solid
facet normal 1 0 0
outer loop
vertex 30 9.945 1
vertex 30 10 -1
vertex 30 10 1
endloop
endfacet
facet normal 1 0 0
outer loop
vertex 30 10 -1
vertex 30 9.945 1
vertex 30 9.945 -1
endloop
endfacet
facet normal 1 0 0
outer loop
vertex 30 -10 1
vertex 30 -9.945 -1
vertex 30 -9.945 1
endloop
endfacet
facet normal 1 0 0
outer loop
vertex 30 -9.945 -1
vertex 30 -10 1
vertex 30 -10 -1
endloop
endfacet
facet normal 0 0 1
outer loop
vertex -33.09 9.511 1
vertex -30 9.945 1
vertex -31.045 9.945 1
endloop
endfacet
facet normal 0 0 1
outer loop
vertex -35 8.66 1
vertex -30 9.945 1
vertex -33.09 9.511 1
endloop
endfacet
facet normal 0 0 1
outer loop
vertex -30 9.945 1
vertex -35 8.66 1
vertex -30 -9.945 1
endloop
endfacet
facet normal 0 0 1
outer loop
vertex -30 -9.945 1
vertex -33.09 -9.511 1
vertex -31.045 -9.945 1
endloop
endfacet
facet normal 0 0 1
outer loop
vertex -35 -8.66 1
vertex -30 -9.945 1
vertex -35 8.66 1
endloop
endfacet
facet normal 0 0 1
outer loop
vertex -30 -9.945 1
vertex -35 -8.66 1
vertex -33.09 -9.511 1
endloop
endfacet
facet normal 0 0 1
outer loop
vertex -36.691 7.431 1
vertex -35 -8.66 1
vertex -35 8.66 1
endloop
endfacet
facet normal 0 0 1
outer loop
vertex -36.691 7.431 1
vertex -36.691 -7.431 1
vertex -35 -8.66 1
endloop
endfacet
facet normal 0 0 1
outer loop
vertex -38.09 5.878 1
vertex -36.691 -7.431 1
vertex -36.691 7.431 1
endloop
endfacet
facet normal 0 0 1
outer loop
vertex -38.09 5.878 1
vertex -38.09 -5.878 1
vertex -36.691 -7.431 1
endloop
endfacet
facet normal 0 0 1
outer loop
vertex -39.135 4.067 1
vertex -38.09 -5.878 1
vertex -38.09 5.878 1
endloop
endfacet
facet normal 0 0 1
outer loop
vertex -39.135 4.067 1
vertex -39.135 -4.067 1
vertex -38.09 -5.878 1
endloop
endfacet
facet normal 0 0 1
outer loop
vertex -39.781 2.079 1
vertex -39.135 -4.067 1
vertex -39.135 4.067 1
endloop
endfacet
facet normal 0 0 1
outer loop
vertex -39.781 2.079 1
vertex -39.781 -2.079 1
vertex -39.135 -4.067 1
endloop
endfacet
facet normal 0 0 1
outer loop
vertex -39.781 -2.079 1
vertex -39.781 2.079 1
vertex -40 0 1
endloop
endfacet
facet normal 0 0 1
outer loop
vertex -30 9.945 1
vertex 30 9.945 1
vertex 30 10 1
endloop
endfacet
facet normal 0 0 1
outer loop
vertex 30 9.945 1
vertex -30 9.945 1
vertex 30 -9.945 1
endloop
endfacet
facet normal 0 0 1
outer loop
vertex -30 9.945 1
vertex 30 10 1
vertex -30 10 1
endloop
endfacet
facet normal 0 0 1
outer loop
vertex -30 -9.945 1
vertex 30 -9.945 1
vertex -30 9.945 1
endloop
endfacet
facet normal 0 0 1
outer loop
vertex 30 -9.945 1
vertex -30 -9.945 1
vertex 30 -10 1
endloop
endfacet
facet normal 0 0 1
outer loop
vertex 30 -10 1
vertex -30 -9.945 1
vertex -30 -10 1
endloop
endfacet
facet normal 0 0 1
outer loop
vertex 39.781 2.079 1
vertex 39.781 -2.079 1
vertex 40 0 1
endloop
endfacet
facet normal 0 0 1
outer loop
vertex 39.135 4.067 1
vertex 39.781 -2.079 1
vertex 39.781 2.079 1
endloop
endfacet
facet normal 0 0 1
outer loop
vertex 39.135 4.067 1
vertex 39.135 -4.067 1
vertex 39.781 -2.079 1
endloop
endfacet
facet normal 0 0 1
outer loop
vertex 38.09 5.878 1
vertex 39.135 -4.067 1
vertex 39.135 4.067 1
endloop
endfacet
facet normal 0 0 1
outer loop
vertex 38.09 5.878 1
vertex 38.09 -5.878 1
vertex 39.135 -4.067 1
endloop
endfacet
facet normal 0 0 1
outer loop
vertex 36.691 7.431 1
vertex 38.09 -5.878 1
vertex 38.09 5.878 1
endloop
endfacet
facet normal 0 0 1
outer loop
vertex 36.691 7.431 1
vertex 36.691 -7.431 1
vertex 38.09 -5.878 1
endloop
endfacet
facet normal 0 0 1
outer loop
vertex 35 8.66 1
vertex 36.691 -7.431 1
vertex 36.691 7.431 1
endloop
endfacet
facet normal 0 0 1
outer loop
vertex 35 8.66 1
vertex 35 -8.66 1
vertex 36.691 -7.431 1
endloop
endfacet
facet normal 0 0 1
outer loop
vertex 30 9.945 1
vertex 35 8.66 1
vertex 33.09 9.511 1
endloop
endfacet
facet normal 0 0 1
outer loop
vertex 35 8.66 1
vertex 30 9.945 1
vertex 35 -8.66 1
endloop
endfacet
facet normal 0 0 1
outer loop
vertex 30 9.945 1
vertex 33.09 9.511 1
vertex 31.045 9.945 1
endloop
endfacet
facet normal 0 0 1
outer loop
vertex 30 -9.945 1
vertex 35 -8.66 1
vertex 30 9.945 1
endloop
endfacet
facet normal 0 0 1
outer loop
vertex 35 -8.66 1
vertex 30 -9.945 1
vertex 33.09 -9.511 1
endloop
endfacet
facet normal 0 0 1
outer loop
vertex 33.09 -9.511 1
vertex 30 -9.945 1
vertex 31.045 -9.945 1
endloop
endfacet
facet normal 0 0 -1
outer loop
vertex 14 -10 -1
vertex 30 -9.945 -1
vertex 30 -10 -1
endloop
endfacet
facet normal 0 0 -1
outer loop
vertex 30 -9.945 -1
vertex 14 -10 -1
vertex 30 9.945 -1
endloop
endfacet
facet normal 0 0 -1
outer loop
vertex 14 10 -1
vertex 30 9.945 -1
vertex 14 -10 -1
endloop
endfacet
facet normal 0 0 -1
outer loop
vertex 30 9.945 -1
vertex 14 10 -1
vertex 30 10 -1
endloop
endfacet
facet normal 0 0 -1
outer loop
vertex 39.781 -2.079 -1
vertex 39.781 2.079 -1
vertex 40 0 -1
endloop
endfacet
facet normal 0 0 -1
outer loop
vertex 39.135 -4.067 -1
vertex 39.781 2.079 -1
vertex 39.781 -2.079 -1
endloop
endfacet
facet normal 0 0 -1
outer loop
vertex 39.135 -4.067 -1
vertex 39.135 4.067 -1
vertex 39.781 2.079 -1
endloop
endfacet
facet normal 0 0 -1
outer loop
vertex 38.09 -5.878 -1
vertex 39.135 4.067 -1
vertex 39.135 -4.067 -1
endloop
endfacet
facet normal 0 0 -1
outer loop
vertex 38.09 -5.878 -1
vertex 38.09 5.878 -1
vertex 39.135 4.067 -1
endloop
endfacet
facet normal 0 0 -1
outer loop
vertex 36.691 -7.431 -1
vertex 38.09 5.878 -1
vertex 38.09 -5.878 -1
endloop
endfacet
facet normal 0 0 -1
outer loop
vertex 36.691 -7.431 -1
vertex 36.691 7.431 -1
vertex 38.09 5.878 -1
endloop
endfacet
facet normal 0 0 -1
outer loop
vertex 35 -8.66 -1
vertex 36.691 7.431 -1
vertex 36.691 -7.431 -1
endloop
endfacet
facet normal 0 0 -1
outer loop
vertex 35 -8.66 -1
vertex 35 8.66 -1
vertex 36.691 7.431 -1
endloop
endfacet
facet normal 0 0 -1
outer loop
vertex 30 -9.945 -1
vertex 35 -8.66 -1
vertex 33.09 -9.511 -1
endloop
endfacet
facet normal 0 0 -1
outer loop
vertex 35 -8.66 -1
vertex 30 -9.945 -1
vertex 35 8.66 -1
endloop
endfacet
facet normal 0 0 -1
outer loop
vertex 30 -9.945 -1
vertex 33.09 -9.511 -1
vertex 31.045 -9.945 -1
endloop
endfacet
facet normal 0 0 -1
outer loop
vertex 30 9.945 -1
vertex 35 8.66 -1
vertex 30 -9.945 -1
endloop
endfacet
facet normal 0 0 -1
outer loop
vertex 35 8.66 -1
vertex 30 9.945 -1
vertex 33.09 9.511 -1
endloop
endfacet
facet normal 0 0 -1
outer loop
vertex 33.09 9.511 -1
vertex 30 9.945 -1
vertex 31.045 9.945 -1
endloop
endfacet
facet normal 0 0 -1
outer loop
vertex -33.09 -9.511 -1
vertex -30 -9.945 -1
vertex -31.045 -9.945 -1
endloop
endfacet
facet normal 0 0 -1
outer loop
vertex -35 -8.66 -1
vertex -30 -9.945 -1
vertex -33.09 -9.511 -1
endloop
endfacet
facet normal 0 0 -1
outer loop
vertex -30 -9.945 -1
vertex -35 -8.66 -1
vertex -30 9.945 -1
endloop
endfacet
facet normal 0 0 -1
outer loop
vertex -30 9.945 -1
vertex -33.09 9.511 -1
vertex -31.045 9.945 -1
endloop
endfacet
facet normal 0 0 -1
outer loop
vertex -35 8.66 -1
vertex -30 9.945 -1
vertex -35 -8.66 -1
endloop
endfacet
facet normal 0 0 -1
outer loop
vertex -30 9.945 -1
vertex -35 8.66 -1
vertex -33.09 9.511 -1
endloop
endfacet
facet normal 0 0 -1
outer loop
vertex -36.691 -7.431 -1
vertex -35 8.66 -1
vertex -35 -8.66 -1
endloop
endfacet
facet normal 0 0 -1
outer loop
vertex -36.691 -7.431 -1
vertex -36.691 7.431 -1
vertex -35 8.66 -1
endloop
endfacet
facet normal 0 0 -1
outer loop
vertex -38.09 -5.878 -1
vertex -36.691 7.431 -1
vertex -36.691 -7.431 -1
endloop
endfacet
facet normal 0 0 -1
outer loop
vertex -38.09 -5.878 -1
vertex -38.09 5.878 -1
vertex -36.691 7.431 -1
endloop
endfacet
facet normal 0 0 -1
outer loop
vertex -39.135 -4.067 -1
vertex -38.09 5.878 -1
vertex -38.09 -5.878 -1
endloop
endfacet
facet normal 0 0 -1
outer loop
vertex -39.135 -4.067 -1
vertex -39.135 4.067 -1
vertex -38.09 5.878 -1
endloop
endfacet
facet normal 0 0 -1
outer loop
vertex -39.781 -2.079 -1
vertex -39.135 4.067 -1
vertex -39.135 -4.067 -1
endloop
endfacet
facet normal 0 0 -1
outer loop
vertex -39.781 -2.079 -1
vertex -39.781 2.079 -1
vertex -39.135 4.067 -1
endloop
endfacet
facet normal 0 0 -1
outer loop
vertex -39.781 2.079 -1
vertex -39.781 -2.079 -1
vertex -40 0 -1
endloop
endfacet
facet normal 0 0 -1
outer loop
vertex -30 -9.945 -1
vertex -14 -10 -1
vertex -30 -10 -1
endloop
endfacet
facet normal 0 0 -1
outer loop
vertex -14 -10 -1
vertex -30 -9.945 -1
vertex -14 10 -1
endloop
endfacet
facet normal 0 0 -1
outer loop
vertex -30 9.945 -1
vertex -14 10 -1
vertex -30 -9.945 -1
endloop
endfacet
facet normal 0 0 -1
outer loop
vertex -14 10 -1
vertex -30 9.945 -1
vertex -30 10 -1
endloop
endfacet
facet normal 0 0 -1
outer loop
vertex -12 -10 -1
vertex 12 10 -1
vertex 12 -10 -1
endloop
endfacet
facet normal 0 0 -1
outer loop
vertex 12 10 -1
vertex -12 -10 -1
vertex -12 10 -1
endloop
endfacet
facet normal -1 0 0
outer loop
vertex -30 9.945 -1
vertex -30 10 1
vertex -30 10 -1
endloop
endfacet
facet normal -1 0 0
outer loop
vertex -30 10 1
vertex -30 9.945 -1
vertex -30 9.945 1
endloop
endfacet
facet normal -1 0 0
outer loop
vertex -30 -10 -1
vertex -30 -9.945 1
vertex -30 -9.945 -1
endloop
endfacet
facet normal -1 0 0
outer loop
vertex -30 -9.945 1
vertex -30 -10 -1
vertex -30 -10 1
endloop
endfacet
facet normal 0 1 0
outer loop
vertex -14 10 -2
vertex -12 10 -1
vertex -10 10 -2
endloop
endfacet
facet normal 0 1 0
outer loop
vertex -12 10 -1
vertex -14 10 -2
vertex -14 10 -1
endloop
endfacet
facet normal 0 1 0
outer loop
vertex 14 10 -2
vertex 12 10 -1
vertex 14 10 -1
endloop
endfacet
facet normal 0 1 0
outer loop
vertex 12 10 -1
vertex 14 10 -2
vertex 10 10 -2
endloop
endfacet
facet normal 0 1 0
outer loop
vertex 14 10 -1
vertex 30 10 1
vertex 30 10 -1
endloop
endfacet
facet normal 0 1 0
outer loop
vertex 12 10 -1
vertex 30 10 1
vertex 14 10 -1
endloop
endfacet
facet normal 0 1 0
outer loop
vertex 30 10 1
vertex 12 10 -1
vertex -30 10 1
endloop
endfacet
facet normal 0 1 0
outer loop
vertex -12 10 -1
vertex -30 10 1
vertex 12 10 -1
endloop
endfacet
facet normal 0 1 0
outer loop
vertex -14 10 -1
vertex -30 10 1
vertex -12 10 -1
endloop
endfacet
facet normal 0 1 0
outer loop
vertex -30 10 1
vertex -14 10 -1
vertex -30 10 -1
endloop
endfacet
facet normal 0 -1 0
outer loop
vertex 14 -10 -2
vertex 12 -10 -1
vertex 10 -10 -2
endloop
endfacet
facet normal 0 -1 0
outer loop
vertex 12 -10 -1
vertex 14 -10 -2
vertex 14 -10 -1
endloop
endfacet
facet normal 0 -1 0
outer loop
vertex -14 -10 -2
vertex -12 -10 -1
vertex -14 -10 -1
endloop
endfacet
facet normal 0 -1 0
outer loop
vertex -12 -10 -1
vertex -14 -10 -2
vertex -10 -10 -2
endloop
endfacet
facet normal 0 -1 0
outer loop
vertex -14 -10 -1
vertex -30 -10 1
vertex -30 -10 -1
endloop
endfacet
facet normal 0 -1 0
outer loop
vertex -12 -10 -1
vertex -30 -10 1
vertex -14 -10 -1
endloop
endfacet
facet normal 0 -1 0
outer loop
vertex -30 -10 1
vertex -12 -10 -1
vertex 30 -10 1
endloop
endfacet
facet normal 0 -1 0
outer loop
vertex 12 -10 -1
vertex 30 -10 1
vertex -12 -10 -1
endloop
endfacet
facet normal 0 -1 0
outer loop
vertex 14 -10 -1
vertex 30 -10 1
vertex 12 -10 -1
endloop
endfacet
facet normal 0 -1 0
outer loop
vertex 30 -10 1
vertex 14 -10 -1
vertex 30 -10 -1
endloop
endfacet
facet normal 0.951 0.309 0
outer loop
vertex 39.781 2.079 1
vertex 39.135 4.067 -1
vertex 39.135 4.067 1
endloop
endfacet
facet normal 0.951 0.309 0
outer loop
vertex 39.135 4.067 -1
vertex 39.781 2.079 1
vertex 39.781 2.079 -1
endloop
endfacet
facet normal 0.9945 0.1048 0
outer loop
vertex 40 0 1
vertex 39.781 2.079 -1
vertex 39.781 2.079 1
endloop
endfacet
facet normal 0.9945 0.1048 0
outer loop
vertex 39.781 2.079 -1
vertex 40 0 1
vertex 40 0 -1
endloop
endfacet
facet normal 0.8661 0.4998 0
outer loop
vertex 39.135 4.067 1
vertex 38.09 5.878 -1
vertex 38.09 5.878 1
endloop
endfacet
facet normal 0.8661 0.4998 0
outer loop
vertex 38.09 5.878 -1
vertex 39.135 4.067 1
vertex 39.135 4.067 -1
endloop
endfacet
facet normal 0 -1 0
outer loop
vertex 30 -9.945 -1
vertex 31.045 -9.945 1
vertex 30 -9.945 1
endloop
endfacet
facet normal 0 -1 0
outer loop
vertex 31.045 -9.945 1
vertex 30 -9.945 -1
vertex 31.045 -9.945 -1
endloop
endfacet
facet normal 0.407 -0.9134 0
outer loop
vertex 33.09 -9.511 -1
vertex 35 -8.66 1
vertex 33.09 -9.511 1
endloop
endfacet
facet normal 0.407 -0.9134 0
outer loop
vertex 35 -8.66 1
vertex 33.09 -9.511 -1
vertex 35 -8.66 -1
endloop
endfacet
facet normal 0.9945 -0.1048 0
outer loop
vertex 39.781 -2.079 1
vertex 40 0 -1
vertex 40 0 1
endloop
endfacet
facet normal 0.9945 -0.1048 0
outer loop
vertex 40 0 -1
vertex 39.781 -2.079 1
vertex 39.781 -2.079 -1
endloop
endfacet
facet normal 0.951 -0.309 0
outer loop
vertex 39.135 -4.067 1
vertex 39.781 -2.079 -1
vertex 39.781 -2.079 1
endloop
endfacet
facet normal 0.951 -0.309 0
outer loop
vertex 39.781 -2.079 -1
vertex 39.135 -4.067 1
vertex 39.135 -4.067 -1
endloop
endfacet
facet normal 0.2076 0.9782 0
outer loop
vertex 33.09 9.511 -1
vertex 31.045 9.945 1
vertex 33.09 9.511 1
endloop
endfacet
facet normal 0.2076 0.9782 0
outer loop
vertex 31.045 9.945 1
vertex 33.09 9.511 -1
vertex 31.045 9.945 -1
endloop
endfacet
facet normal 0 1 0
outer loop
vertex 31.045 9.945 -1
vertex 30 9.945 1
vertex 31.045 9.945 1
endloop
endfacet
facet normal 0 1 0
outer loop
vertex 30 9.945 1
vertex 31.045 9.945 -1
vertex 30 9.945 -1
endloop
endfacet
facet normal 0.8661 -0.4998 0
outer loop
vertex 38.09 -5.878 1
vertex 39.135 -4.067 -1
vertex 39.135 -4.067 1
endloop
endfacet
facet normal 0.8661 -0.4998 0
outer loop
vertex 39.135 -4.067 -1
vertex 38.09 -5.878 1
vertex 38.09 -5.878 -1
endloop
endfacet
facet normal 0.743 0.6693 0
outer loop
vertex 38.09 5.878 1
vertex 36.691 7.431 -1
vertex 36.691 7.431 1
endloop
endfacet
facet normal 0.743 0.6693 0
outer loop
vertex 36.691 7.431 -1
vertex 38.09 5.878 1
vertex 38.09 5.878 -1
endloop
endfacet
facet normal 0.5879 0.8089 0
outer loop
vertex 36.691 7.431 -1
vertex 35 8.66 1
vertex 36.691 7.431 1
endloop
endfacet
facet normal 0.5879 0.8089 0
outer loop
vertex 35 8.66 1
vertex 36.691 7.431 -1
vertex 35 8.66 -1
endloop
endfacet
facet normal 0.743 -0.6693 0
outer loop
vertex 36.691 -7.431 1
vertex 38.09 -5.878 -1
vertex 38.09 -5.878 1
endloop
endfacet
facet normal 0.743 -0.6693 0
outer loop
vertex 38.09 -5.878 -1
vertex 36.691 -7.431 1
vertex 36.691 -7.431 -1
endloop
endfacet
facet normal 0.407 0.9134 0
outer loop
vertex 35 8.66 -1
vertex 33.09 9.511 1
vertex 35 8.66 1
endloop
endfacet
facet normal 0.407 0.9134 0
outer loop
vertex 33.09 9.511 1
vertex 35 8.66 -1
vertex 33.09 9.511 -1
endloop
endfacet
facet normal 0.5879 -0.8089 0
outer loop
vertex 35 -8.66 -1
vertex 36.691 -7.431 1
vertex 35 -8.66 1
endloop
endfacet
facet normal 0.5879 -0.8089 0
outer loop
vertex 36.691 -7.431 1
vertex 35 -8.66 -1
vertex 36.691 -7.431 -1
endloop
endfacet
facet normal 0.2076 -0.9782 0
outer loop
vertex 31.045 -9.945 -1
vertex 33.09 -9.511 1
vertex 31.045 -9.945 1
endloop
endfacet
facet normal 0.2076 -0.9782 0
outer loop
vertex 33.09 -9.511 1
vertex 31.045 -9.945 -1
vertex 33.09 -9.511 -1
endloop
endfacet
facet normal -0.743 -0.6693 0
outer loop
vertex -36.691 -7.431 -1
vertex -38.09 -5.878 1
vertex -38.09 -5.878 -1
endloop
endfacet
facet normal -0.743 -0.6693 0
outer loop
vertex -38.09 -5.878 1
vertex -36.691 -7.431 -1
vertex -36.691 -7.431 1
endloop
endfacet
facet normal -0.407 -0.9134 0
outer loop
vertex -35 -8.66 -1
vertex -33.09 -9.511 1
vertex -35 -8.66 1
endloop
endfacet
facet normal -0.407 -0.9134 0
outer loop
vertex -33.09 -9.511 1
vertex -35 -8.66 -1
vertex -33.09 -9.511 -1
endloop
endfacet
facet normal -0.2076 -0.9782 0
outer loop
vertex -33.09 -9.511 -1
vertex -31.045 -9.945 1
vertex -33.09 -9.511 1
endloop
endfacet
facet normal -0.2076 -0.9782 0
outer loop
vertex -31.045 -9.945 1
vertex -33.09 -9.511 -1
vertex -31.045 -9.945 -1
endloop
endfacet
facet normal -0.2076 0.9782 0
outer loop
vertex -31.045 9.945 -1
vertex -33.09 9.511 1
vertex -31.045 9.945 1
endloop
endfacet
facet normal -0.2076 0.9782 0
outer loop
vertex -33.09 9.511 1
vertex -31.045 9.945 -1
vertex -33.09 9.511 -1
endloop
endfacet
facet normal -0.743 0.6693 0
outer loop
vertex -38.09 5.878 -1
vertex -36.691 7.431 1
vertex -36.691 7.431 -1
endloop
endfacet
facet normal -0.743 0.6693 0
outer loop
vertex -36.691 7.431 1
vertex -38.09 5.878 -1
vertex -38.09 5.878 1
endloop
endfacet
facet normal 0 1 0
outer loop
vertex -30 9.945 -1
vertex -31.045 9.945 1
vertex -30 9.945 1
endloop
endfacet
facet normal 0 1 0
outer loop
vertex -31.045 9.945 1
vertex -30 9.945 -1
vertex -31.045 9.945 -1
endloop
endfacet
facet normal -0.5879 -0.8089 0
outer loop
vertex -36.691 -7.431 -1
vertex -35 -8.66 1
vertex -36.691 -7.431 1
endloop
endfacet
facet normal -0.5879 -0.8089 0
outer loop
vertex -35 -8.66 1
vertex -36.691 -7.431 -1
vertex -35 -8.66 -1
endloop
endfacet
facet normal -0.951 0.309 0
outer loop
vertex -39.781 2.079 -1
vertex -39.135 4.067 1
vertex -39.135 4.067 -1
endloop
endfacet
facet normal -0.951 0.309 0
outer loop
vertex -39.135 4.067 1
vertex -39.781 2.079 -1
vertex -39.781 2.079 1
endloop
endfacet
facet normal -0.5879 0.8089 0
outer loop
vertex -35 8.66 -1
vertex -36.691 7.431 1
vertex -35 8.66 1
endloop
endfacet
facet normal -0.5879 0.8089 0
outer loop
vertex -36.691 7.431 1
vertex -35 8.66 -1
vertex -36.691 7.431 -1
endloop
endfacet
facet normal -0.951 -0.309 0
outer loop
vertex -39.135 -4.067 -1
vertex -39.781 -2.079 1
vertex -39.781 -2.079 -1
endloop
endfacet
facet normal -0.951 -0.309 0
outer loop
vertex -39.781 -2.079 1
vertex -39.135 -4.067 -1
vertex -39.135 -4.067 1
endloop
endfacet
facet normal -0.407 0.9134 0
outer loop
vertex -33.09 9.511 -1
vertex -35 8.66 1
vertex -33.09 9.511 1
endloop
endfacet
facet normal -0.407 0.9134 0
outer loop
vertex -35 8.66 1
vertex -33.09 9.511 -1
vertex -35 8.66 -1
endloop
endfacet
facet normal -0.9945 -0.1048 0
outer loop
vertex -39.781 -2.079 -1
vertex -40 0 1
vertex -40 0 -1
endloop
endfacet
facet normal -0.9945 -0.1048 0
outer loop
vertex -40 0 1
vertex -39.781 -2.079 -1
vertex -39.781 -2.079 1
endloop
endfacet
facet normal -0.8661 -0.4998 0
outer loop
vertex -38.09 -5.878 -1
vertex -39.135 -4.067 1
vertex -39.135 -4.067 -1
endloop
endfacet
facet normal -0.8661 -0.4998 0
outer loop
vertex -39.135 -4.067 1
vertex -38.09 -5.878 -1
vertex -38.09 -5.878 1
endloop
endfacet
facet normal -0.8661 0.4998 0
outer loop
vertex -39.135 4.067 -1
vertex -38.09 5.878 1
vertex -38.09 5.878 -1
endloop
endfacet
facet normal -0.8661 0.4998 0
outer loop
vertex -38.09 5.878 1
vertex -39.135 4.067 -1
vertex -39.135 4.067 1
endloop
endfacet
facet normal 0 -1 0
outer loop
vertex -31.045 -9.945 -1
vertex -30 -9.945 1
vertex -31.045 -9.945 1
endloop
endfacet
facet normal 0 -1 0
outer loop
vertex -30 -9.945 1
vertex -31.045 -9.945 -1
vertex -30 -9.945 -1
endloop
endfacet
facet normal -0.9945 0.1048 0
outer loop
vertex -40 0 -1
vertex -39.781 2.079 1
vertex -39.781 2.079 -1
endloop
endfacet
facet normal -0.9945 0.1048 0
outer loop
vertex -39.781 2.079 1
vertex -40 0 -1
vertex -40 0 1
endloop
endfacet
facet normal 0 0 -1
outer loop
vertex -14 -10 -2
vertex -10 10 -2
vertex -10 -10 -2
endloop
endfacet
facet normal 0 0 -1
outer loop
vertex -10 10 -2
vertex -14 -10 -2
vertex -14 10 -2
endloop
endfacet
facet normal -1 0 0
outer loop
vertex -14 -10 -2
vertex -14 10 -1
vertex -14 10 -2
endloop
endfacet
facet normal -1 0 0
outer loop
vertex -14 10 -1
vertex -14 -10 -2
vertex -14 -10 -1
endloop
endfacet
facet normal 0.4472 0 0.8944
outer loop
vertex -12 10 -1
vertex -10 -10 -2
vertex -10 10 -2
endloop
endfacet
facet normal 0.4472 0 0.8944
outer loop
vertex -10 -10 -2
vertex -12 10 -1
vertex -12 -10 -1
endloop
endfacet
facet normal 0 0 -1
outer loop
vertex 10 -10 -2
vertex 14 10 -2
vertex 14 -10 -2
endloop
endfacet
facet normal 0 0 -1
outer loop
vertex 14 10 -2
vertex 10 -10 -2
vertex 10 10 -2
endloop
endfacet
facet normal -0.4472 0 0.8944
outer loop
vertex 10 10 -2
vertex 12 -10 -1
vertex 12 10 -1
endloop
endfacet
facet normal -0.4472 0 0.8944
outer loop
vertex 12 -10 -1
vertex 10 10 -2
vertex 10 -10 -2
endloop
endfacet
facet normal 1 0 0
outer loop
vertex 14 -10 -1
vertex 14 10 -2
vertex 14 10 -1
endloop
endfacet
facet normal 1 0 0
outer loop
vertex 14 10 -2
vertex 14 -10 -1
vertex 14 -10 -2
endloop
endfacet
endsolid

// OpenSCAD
echo(version=version());

module prism(l, w, h){
       polyhedron(
               points=[[0,0,0], [l,0,0], [l,w,0], [0,w,0], [0,w,h], [l,w,h]],
               faces=[[0,1,2,3],[5,4,3,2],[0,4,5,1],[0,3,4],[5,2,1]]
               );
       
}

    l = 60;
    w = 20;
    h = 2;
    r=w/2;
    
    color("red")
        translate([0, 0, 0])
            cube([l, w,h], center = true);

// using the scale parameter a frustum can be constructed
    color("cyan"){
        translate([l/2, 0, 0])
        cylinder(h,r,r, center = true);
    }

    color("cyan"){
        translate([-l/2, 0, 0])
        cylinder(h,r,r, center = true);
    }

    color("blue") 
        translate([-10,-w/2,-h])
        rotate(90)
        prism(w,4,2, center=true);
    
    color("blue") 
        translate([10,w/2,-h])
        rotate(-90)
        prism(w,4,2, center=true);
        

// Written in 2015 by Torsten Paul <Torsten.Paul@gmx.de>
//
// To the extent possible under law, the author(s) have dedicated all
// copyright and related and neighboring rights to this software to the
// public domain worldwide. This software is distributed without any
// warranty.
//
// You should have received a copy of the CC0 Public Domain
// Dedication along with this software.
// If not, see <http://creativecommons.org/publicdomain/zero/1.0/>.
